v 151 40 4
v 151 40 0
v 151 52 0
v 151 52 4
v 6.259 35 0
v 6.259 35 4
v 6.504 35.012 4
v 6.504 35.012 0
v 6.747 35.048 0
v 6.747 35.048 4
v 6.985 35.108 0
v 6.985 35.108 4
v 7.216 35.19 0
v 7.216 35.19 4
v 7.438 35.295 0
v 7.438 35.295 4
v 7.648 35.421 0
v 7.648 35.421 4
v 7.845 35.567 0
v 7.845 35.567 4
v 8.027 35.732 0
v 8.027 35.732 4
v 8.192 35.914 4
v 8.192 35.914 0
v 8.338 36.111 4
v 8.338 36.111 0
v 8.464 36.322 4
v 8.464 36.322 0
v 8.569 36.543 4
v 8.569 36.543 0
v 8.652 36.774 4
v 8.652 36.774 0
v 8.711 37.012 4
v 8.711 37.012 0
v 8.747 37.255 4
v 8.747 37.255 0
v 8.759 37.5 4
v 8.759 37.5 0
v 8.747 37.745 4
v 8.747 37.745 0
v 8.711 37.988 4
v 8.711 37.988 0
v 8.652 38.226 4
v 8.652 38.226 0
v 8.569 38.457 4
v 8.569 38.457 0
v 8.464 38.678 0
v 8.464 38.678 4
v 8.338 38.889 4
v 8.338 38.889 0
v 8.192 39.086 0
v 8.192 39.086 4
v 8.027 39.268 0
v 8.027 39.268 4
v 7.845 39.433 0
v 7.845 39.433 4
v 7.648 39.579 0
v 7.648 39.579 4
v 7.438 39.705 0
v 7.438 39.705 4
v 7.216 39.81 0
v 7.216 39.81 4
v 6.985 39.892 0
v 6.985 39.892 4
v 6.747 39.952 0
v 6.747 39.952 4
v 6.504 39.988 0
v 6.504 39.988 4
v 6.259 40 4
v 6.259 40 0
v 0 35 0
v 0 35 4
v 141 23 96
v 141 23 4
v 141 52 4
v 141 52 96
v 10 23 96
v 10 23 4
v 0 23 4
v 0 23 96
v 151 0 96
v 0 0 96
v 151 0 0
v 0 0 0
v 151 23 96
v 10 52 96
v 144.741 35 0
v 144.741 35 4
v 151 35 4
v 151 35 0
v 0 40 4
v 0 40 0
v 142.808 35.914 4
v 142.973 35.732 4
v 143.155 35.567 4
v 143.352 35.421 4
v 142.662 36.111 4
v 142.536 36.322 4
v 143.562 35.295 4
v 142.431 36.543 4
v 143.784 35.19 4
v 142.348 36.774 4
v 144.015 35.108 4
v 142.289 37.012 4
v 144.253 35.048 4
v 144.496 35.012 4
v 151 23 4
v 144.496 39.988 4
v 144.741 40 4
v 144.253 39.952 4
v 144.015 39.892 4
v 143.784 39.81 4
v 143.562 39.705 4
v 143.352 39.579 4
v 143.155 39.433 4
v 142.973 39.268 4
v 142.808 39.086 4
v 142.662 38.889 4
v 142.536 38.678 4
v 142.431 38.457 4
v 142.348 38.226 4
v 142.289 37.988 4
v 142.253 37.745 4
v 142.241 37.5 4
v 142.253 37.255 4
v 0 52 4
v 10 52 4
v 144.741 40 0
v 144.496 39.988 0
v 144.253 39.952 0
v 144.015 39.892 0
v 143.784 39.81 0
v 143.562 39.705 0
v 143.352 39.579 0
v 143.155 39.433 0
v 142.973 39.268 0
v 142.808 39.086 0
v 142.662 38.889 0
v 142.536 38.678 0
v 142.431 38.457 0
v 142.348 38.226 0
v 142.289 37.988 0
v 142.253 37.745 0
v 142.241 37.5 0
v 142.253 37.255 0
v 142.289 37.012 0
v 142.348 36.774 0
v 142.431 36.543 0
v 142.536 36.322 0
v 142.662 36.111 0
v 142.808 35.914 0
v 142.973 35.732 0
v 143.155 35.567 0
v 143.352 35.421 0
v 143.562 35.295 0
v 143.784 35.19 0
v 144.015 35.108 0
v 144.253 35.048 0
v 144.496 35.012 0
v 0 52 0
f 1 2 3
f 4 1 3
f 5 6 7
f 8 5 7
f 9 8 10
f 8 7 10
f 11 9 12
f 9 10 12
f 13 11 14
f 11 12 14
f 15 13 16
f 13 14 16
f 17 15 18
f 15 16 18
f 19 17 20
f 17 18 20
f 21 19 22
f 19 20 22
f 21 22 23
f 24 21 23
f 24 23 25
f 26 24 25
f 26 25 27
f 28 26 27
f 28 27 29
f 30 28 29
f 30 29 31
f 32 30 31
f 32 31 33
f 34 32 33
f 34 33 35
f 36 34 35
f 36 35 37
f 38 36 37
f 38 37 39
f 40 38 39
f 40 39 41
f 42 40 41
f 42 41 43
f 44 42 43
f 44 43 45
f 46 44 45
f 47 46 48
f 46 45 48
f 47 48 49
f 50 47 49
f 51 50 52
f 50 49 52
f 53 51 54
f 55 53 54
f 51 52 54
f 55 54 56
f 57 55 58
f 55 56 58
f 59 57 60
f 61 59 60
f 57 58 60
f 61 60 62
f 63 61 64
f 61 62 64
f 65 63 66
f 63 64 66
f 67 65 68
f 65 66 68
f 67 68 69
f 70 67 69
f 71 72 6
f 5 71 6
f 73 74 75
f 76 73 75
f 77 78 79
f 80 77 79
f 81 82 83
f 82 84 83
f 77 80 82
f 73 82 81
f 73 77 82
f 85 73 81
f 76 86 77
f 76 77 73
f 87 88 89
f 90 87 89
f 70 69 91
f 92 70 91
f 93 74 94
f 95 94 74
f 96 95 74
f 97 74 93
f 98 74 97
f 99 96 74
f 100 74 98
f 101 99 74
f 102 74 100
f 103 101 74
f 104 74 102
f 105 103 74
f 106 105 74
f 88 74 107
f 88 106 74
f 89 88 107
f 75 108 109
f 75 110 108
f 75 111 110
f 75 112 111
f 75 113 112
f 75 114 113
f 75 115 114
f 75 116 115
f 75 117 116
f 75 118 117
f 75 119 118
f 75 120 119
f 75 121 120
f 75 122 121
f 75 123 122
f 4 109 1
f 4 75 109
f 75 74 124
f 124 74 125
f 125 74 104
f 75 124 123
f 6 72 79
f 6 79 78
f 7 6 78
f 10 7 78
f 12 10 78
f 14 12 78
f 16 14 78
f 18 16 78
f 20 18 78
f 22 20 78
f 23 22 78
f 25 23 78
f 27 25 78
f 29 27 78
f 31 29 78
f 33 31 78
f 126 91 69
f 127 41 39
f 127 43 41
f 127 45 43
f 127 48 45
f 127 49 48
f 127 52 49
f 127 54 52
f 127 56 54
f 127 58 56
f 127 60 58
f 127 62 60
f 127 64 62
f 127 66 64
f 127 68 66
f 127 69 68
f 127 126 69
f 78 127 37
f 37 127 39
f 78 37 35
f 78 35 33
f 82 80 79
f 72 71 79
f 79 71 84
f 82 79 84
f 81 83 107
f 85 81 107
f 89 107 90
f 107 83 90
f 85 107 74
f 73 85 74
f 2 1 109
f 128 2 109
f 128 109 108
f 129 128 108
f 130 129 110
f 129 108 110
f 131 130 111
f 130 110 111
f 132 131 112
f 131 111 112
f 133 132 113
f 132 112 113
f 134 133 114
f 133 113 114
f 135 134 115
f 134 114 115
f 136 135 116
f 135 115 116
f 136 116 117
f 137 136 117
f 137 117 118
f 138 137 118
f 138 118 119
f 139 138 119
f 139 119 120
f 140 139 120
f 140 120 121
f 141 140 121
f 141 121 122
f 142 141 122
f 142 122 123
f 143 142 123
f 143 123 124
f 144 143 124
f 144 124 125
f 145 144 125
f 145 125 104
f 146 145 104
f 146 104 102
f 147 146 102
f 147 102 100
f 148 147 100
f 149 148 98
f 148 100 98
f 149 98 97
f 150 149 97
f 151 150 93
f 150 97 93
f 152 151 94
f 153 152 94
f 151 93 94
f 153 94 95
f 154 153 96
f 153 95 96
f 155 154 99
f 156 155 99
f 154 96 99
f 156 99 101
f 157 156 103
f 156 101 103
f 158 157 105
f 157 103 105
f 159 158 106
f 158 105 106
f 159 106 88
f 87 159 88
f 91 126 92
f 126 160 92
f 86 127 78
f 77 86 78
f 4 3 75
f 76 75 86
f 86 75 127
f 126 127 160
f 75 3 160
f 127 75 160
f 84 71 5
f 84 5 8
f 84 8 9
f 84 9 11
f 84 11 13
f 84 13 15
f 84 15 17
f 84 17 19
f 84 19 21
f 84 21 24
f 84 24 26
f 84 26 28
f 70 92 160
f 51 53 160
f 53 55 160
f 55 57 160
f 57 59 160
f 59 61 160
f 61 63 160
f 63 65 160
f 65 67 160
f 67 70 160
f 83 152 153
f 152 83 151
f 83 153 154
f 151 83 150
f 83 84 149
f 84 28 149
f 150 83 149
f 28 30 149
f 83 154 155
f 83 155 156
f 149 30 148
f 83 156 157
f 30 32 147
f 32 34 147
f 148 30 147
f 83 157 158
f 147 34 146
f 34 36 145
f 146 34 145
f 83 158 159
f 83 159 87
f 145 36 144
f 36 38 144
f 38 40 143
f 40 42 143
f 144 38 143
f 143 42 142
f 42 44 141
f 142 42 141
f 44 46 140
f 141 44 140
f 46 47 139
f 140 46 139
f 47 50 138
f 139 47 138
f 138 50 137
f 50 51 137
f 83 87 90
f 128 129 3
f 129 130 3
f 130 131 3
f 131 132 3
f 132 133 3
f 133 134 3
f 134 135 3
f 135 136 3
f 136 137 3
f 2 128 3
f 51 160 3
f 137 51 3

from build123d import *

# Parameters (mm, degrees)
F0_W     = 151
F0_H     = 52
F1_DEPTH = 4
F3_DEPTH = 92
F4_DEPTH = 25


with BuildPart() as f1:
    # F0 (on Top) → F1 (new body)
    with BuildSketch(Plane.XY):
        with Locations((75.5, 26)):
            Rectangle(F0_W, F0_H)
    extrude(amount=F1_DEPTH)

    # F2 (on face) → F3 (join)
    with BuildSketch(Plane.XY.offset(4)):
        Polygon((141, 23), (141, 52), (75.5, 52), (75.5, 0), (151, 0), (151, 23), align=None)
        Polygon((75.5, 0), (75.5, 52), (10, 52), (10, 23), (0, 23), (0, 0), align=None)
    extrude(amount=F3_DEPTH)

    # F2 (on face) → F4 (cut)
    with BuildSketch(Plane.XY.offset(4)):
        with BuildLine():
            Line((6.259378, 40), (0, 40))
            Line((0, 40), (0, 35))
            Line((0, 35), (6.259378, 35))
            ThreePointArc((6.259378, 35), (8.759378, 37.5), (6.259378, 40))
        make_face()
        with BuildLine():
            Line((151, 35), (151, 40))
            Line((151, 40), (144.740622, 40))
            ThreePointArc((144.740622, 40), (142.240622, 37.5), (144.740622, 35))
            Line((144.740622, 35), (151, 35))
        make_face()
    extrude(amount=-F4_DEPTH, mode=Mode.SUBTRACT)


solid = f1.part
